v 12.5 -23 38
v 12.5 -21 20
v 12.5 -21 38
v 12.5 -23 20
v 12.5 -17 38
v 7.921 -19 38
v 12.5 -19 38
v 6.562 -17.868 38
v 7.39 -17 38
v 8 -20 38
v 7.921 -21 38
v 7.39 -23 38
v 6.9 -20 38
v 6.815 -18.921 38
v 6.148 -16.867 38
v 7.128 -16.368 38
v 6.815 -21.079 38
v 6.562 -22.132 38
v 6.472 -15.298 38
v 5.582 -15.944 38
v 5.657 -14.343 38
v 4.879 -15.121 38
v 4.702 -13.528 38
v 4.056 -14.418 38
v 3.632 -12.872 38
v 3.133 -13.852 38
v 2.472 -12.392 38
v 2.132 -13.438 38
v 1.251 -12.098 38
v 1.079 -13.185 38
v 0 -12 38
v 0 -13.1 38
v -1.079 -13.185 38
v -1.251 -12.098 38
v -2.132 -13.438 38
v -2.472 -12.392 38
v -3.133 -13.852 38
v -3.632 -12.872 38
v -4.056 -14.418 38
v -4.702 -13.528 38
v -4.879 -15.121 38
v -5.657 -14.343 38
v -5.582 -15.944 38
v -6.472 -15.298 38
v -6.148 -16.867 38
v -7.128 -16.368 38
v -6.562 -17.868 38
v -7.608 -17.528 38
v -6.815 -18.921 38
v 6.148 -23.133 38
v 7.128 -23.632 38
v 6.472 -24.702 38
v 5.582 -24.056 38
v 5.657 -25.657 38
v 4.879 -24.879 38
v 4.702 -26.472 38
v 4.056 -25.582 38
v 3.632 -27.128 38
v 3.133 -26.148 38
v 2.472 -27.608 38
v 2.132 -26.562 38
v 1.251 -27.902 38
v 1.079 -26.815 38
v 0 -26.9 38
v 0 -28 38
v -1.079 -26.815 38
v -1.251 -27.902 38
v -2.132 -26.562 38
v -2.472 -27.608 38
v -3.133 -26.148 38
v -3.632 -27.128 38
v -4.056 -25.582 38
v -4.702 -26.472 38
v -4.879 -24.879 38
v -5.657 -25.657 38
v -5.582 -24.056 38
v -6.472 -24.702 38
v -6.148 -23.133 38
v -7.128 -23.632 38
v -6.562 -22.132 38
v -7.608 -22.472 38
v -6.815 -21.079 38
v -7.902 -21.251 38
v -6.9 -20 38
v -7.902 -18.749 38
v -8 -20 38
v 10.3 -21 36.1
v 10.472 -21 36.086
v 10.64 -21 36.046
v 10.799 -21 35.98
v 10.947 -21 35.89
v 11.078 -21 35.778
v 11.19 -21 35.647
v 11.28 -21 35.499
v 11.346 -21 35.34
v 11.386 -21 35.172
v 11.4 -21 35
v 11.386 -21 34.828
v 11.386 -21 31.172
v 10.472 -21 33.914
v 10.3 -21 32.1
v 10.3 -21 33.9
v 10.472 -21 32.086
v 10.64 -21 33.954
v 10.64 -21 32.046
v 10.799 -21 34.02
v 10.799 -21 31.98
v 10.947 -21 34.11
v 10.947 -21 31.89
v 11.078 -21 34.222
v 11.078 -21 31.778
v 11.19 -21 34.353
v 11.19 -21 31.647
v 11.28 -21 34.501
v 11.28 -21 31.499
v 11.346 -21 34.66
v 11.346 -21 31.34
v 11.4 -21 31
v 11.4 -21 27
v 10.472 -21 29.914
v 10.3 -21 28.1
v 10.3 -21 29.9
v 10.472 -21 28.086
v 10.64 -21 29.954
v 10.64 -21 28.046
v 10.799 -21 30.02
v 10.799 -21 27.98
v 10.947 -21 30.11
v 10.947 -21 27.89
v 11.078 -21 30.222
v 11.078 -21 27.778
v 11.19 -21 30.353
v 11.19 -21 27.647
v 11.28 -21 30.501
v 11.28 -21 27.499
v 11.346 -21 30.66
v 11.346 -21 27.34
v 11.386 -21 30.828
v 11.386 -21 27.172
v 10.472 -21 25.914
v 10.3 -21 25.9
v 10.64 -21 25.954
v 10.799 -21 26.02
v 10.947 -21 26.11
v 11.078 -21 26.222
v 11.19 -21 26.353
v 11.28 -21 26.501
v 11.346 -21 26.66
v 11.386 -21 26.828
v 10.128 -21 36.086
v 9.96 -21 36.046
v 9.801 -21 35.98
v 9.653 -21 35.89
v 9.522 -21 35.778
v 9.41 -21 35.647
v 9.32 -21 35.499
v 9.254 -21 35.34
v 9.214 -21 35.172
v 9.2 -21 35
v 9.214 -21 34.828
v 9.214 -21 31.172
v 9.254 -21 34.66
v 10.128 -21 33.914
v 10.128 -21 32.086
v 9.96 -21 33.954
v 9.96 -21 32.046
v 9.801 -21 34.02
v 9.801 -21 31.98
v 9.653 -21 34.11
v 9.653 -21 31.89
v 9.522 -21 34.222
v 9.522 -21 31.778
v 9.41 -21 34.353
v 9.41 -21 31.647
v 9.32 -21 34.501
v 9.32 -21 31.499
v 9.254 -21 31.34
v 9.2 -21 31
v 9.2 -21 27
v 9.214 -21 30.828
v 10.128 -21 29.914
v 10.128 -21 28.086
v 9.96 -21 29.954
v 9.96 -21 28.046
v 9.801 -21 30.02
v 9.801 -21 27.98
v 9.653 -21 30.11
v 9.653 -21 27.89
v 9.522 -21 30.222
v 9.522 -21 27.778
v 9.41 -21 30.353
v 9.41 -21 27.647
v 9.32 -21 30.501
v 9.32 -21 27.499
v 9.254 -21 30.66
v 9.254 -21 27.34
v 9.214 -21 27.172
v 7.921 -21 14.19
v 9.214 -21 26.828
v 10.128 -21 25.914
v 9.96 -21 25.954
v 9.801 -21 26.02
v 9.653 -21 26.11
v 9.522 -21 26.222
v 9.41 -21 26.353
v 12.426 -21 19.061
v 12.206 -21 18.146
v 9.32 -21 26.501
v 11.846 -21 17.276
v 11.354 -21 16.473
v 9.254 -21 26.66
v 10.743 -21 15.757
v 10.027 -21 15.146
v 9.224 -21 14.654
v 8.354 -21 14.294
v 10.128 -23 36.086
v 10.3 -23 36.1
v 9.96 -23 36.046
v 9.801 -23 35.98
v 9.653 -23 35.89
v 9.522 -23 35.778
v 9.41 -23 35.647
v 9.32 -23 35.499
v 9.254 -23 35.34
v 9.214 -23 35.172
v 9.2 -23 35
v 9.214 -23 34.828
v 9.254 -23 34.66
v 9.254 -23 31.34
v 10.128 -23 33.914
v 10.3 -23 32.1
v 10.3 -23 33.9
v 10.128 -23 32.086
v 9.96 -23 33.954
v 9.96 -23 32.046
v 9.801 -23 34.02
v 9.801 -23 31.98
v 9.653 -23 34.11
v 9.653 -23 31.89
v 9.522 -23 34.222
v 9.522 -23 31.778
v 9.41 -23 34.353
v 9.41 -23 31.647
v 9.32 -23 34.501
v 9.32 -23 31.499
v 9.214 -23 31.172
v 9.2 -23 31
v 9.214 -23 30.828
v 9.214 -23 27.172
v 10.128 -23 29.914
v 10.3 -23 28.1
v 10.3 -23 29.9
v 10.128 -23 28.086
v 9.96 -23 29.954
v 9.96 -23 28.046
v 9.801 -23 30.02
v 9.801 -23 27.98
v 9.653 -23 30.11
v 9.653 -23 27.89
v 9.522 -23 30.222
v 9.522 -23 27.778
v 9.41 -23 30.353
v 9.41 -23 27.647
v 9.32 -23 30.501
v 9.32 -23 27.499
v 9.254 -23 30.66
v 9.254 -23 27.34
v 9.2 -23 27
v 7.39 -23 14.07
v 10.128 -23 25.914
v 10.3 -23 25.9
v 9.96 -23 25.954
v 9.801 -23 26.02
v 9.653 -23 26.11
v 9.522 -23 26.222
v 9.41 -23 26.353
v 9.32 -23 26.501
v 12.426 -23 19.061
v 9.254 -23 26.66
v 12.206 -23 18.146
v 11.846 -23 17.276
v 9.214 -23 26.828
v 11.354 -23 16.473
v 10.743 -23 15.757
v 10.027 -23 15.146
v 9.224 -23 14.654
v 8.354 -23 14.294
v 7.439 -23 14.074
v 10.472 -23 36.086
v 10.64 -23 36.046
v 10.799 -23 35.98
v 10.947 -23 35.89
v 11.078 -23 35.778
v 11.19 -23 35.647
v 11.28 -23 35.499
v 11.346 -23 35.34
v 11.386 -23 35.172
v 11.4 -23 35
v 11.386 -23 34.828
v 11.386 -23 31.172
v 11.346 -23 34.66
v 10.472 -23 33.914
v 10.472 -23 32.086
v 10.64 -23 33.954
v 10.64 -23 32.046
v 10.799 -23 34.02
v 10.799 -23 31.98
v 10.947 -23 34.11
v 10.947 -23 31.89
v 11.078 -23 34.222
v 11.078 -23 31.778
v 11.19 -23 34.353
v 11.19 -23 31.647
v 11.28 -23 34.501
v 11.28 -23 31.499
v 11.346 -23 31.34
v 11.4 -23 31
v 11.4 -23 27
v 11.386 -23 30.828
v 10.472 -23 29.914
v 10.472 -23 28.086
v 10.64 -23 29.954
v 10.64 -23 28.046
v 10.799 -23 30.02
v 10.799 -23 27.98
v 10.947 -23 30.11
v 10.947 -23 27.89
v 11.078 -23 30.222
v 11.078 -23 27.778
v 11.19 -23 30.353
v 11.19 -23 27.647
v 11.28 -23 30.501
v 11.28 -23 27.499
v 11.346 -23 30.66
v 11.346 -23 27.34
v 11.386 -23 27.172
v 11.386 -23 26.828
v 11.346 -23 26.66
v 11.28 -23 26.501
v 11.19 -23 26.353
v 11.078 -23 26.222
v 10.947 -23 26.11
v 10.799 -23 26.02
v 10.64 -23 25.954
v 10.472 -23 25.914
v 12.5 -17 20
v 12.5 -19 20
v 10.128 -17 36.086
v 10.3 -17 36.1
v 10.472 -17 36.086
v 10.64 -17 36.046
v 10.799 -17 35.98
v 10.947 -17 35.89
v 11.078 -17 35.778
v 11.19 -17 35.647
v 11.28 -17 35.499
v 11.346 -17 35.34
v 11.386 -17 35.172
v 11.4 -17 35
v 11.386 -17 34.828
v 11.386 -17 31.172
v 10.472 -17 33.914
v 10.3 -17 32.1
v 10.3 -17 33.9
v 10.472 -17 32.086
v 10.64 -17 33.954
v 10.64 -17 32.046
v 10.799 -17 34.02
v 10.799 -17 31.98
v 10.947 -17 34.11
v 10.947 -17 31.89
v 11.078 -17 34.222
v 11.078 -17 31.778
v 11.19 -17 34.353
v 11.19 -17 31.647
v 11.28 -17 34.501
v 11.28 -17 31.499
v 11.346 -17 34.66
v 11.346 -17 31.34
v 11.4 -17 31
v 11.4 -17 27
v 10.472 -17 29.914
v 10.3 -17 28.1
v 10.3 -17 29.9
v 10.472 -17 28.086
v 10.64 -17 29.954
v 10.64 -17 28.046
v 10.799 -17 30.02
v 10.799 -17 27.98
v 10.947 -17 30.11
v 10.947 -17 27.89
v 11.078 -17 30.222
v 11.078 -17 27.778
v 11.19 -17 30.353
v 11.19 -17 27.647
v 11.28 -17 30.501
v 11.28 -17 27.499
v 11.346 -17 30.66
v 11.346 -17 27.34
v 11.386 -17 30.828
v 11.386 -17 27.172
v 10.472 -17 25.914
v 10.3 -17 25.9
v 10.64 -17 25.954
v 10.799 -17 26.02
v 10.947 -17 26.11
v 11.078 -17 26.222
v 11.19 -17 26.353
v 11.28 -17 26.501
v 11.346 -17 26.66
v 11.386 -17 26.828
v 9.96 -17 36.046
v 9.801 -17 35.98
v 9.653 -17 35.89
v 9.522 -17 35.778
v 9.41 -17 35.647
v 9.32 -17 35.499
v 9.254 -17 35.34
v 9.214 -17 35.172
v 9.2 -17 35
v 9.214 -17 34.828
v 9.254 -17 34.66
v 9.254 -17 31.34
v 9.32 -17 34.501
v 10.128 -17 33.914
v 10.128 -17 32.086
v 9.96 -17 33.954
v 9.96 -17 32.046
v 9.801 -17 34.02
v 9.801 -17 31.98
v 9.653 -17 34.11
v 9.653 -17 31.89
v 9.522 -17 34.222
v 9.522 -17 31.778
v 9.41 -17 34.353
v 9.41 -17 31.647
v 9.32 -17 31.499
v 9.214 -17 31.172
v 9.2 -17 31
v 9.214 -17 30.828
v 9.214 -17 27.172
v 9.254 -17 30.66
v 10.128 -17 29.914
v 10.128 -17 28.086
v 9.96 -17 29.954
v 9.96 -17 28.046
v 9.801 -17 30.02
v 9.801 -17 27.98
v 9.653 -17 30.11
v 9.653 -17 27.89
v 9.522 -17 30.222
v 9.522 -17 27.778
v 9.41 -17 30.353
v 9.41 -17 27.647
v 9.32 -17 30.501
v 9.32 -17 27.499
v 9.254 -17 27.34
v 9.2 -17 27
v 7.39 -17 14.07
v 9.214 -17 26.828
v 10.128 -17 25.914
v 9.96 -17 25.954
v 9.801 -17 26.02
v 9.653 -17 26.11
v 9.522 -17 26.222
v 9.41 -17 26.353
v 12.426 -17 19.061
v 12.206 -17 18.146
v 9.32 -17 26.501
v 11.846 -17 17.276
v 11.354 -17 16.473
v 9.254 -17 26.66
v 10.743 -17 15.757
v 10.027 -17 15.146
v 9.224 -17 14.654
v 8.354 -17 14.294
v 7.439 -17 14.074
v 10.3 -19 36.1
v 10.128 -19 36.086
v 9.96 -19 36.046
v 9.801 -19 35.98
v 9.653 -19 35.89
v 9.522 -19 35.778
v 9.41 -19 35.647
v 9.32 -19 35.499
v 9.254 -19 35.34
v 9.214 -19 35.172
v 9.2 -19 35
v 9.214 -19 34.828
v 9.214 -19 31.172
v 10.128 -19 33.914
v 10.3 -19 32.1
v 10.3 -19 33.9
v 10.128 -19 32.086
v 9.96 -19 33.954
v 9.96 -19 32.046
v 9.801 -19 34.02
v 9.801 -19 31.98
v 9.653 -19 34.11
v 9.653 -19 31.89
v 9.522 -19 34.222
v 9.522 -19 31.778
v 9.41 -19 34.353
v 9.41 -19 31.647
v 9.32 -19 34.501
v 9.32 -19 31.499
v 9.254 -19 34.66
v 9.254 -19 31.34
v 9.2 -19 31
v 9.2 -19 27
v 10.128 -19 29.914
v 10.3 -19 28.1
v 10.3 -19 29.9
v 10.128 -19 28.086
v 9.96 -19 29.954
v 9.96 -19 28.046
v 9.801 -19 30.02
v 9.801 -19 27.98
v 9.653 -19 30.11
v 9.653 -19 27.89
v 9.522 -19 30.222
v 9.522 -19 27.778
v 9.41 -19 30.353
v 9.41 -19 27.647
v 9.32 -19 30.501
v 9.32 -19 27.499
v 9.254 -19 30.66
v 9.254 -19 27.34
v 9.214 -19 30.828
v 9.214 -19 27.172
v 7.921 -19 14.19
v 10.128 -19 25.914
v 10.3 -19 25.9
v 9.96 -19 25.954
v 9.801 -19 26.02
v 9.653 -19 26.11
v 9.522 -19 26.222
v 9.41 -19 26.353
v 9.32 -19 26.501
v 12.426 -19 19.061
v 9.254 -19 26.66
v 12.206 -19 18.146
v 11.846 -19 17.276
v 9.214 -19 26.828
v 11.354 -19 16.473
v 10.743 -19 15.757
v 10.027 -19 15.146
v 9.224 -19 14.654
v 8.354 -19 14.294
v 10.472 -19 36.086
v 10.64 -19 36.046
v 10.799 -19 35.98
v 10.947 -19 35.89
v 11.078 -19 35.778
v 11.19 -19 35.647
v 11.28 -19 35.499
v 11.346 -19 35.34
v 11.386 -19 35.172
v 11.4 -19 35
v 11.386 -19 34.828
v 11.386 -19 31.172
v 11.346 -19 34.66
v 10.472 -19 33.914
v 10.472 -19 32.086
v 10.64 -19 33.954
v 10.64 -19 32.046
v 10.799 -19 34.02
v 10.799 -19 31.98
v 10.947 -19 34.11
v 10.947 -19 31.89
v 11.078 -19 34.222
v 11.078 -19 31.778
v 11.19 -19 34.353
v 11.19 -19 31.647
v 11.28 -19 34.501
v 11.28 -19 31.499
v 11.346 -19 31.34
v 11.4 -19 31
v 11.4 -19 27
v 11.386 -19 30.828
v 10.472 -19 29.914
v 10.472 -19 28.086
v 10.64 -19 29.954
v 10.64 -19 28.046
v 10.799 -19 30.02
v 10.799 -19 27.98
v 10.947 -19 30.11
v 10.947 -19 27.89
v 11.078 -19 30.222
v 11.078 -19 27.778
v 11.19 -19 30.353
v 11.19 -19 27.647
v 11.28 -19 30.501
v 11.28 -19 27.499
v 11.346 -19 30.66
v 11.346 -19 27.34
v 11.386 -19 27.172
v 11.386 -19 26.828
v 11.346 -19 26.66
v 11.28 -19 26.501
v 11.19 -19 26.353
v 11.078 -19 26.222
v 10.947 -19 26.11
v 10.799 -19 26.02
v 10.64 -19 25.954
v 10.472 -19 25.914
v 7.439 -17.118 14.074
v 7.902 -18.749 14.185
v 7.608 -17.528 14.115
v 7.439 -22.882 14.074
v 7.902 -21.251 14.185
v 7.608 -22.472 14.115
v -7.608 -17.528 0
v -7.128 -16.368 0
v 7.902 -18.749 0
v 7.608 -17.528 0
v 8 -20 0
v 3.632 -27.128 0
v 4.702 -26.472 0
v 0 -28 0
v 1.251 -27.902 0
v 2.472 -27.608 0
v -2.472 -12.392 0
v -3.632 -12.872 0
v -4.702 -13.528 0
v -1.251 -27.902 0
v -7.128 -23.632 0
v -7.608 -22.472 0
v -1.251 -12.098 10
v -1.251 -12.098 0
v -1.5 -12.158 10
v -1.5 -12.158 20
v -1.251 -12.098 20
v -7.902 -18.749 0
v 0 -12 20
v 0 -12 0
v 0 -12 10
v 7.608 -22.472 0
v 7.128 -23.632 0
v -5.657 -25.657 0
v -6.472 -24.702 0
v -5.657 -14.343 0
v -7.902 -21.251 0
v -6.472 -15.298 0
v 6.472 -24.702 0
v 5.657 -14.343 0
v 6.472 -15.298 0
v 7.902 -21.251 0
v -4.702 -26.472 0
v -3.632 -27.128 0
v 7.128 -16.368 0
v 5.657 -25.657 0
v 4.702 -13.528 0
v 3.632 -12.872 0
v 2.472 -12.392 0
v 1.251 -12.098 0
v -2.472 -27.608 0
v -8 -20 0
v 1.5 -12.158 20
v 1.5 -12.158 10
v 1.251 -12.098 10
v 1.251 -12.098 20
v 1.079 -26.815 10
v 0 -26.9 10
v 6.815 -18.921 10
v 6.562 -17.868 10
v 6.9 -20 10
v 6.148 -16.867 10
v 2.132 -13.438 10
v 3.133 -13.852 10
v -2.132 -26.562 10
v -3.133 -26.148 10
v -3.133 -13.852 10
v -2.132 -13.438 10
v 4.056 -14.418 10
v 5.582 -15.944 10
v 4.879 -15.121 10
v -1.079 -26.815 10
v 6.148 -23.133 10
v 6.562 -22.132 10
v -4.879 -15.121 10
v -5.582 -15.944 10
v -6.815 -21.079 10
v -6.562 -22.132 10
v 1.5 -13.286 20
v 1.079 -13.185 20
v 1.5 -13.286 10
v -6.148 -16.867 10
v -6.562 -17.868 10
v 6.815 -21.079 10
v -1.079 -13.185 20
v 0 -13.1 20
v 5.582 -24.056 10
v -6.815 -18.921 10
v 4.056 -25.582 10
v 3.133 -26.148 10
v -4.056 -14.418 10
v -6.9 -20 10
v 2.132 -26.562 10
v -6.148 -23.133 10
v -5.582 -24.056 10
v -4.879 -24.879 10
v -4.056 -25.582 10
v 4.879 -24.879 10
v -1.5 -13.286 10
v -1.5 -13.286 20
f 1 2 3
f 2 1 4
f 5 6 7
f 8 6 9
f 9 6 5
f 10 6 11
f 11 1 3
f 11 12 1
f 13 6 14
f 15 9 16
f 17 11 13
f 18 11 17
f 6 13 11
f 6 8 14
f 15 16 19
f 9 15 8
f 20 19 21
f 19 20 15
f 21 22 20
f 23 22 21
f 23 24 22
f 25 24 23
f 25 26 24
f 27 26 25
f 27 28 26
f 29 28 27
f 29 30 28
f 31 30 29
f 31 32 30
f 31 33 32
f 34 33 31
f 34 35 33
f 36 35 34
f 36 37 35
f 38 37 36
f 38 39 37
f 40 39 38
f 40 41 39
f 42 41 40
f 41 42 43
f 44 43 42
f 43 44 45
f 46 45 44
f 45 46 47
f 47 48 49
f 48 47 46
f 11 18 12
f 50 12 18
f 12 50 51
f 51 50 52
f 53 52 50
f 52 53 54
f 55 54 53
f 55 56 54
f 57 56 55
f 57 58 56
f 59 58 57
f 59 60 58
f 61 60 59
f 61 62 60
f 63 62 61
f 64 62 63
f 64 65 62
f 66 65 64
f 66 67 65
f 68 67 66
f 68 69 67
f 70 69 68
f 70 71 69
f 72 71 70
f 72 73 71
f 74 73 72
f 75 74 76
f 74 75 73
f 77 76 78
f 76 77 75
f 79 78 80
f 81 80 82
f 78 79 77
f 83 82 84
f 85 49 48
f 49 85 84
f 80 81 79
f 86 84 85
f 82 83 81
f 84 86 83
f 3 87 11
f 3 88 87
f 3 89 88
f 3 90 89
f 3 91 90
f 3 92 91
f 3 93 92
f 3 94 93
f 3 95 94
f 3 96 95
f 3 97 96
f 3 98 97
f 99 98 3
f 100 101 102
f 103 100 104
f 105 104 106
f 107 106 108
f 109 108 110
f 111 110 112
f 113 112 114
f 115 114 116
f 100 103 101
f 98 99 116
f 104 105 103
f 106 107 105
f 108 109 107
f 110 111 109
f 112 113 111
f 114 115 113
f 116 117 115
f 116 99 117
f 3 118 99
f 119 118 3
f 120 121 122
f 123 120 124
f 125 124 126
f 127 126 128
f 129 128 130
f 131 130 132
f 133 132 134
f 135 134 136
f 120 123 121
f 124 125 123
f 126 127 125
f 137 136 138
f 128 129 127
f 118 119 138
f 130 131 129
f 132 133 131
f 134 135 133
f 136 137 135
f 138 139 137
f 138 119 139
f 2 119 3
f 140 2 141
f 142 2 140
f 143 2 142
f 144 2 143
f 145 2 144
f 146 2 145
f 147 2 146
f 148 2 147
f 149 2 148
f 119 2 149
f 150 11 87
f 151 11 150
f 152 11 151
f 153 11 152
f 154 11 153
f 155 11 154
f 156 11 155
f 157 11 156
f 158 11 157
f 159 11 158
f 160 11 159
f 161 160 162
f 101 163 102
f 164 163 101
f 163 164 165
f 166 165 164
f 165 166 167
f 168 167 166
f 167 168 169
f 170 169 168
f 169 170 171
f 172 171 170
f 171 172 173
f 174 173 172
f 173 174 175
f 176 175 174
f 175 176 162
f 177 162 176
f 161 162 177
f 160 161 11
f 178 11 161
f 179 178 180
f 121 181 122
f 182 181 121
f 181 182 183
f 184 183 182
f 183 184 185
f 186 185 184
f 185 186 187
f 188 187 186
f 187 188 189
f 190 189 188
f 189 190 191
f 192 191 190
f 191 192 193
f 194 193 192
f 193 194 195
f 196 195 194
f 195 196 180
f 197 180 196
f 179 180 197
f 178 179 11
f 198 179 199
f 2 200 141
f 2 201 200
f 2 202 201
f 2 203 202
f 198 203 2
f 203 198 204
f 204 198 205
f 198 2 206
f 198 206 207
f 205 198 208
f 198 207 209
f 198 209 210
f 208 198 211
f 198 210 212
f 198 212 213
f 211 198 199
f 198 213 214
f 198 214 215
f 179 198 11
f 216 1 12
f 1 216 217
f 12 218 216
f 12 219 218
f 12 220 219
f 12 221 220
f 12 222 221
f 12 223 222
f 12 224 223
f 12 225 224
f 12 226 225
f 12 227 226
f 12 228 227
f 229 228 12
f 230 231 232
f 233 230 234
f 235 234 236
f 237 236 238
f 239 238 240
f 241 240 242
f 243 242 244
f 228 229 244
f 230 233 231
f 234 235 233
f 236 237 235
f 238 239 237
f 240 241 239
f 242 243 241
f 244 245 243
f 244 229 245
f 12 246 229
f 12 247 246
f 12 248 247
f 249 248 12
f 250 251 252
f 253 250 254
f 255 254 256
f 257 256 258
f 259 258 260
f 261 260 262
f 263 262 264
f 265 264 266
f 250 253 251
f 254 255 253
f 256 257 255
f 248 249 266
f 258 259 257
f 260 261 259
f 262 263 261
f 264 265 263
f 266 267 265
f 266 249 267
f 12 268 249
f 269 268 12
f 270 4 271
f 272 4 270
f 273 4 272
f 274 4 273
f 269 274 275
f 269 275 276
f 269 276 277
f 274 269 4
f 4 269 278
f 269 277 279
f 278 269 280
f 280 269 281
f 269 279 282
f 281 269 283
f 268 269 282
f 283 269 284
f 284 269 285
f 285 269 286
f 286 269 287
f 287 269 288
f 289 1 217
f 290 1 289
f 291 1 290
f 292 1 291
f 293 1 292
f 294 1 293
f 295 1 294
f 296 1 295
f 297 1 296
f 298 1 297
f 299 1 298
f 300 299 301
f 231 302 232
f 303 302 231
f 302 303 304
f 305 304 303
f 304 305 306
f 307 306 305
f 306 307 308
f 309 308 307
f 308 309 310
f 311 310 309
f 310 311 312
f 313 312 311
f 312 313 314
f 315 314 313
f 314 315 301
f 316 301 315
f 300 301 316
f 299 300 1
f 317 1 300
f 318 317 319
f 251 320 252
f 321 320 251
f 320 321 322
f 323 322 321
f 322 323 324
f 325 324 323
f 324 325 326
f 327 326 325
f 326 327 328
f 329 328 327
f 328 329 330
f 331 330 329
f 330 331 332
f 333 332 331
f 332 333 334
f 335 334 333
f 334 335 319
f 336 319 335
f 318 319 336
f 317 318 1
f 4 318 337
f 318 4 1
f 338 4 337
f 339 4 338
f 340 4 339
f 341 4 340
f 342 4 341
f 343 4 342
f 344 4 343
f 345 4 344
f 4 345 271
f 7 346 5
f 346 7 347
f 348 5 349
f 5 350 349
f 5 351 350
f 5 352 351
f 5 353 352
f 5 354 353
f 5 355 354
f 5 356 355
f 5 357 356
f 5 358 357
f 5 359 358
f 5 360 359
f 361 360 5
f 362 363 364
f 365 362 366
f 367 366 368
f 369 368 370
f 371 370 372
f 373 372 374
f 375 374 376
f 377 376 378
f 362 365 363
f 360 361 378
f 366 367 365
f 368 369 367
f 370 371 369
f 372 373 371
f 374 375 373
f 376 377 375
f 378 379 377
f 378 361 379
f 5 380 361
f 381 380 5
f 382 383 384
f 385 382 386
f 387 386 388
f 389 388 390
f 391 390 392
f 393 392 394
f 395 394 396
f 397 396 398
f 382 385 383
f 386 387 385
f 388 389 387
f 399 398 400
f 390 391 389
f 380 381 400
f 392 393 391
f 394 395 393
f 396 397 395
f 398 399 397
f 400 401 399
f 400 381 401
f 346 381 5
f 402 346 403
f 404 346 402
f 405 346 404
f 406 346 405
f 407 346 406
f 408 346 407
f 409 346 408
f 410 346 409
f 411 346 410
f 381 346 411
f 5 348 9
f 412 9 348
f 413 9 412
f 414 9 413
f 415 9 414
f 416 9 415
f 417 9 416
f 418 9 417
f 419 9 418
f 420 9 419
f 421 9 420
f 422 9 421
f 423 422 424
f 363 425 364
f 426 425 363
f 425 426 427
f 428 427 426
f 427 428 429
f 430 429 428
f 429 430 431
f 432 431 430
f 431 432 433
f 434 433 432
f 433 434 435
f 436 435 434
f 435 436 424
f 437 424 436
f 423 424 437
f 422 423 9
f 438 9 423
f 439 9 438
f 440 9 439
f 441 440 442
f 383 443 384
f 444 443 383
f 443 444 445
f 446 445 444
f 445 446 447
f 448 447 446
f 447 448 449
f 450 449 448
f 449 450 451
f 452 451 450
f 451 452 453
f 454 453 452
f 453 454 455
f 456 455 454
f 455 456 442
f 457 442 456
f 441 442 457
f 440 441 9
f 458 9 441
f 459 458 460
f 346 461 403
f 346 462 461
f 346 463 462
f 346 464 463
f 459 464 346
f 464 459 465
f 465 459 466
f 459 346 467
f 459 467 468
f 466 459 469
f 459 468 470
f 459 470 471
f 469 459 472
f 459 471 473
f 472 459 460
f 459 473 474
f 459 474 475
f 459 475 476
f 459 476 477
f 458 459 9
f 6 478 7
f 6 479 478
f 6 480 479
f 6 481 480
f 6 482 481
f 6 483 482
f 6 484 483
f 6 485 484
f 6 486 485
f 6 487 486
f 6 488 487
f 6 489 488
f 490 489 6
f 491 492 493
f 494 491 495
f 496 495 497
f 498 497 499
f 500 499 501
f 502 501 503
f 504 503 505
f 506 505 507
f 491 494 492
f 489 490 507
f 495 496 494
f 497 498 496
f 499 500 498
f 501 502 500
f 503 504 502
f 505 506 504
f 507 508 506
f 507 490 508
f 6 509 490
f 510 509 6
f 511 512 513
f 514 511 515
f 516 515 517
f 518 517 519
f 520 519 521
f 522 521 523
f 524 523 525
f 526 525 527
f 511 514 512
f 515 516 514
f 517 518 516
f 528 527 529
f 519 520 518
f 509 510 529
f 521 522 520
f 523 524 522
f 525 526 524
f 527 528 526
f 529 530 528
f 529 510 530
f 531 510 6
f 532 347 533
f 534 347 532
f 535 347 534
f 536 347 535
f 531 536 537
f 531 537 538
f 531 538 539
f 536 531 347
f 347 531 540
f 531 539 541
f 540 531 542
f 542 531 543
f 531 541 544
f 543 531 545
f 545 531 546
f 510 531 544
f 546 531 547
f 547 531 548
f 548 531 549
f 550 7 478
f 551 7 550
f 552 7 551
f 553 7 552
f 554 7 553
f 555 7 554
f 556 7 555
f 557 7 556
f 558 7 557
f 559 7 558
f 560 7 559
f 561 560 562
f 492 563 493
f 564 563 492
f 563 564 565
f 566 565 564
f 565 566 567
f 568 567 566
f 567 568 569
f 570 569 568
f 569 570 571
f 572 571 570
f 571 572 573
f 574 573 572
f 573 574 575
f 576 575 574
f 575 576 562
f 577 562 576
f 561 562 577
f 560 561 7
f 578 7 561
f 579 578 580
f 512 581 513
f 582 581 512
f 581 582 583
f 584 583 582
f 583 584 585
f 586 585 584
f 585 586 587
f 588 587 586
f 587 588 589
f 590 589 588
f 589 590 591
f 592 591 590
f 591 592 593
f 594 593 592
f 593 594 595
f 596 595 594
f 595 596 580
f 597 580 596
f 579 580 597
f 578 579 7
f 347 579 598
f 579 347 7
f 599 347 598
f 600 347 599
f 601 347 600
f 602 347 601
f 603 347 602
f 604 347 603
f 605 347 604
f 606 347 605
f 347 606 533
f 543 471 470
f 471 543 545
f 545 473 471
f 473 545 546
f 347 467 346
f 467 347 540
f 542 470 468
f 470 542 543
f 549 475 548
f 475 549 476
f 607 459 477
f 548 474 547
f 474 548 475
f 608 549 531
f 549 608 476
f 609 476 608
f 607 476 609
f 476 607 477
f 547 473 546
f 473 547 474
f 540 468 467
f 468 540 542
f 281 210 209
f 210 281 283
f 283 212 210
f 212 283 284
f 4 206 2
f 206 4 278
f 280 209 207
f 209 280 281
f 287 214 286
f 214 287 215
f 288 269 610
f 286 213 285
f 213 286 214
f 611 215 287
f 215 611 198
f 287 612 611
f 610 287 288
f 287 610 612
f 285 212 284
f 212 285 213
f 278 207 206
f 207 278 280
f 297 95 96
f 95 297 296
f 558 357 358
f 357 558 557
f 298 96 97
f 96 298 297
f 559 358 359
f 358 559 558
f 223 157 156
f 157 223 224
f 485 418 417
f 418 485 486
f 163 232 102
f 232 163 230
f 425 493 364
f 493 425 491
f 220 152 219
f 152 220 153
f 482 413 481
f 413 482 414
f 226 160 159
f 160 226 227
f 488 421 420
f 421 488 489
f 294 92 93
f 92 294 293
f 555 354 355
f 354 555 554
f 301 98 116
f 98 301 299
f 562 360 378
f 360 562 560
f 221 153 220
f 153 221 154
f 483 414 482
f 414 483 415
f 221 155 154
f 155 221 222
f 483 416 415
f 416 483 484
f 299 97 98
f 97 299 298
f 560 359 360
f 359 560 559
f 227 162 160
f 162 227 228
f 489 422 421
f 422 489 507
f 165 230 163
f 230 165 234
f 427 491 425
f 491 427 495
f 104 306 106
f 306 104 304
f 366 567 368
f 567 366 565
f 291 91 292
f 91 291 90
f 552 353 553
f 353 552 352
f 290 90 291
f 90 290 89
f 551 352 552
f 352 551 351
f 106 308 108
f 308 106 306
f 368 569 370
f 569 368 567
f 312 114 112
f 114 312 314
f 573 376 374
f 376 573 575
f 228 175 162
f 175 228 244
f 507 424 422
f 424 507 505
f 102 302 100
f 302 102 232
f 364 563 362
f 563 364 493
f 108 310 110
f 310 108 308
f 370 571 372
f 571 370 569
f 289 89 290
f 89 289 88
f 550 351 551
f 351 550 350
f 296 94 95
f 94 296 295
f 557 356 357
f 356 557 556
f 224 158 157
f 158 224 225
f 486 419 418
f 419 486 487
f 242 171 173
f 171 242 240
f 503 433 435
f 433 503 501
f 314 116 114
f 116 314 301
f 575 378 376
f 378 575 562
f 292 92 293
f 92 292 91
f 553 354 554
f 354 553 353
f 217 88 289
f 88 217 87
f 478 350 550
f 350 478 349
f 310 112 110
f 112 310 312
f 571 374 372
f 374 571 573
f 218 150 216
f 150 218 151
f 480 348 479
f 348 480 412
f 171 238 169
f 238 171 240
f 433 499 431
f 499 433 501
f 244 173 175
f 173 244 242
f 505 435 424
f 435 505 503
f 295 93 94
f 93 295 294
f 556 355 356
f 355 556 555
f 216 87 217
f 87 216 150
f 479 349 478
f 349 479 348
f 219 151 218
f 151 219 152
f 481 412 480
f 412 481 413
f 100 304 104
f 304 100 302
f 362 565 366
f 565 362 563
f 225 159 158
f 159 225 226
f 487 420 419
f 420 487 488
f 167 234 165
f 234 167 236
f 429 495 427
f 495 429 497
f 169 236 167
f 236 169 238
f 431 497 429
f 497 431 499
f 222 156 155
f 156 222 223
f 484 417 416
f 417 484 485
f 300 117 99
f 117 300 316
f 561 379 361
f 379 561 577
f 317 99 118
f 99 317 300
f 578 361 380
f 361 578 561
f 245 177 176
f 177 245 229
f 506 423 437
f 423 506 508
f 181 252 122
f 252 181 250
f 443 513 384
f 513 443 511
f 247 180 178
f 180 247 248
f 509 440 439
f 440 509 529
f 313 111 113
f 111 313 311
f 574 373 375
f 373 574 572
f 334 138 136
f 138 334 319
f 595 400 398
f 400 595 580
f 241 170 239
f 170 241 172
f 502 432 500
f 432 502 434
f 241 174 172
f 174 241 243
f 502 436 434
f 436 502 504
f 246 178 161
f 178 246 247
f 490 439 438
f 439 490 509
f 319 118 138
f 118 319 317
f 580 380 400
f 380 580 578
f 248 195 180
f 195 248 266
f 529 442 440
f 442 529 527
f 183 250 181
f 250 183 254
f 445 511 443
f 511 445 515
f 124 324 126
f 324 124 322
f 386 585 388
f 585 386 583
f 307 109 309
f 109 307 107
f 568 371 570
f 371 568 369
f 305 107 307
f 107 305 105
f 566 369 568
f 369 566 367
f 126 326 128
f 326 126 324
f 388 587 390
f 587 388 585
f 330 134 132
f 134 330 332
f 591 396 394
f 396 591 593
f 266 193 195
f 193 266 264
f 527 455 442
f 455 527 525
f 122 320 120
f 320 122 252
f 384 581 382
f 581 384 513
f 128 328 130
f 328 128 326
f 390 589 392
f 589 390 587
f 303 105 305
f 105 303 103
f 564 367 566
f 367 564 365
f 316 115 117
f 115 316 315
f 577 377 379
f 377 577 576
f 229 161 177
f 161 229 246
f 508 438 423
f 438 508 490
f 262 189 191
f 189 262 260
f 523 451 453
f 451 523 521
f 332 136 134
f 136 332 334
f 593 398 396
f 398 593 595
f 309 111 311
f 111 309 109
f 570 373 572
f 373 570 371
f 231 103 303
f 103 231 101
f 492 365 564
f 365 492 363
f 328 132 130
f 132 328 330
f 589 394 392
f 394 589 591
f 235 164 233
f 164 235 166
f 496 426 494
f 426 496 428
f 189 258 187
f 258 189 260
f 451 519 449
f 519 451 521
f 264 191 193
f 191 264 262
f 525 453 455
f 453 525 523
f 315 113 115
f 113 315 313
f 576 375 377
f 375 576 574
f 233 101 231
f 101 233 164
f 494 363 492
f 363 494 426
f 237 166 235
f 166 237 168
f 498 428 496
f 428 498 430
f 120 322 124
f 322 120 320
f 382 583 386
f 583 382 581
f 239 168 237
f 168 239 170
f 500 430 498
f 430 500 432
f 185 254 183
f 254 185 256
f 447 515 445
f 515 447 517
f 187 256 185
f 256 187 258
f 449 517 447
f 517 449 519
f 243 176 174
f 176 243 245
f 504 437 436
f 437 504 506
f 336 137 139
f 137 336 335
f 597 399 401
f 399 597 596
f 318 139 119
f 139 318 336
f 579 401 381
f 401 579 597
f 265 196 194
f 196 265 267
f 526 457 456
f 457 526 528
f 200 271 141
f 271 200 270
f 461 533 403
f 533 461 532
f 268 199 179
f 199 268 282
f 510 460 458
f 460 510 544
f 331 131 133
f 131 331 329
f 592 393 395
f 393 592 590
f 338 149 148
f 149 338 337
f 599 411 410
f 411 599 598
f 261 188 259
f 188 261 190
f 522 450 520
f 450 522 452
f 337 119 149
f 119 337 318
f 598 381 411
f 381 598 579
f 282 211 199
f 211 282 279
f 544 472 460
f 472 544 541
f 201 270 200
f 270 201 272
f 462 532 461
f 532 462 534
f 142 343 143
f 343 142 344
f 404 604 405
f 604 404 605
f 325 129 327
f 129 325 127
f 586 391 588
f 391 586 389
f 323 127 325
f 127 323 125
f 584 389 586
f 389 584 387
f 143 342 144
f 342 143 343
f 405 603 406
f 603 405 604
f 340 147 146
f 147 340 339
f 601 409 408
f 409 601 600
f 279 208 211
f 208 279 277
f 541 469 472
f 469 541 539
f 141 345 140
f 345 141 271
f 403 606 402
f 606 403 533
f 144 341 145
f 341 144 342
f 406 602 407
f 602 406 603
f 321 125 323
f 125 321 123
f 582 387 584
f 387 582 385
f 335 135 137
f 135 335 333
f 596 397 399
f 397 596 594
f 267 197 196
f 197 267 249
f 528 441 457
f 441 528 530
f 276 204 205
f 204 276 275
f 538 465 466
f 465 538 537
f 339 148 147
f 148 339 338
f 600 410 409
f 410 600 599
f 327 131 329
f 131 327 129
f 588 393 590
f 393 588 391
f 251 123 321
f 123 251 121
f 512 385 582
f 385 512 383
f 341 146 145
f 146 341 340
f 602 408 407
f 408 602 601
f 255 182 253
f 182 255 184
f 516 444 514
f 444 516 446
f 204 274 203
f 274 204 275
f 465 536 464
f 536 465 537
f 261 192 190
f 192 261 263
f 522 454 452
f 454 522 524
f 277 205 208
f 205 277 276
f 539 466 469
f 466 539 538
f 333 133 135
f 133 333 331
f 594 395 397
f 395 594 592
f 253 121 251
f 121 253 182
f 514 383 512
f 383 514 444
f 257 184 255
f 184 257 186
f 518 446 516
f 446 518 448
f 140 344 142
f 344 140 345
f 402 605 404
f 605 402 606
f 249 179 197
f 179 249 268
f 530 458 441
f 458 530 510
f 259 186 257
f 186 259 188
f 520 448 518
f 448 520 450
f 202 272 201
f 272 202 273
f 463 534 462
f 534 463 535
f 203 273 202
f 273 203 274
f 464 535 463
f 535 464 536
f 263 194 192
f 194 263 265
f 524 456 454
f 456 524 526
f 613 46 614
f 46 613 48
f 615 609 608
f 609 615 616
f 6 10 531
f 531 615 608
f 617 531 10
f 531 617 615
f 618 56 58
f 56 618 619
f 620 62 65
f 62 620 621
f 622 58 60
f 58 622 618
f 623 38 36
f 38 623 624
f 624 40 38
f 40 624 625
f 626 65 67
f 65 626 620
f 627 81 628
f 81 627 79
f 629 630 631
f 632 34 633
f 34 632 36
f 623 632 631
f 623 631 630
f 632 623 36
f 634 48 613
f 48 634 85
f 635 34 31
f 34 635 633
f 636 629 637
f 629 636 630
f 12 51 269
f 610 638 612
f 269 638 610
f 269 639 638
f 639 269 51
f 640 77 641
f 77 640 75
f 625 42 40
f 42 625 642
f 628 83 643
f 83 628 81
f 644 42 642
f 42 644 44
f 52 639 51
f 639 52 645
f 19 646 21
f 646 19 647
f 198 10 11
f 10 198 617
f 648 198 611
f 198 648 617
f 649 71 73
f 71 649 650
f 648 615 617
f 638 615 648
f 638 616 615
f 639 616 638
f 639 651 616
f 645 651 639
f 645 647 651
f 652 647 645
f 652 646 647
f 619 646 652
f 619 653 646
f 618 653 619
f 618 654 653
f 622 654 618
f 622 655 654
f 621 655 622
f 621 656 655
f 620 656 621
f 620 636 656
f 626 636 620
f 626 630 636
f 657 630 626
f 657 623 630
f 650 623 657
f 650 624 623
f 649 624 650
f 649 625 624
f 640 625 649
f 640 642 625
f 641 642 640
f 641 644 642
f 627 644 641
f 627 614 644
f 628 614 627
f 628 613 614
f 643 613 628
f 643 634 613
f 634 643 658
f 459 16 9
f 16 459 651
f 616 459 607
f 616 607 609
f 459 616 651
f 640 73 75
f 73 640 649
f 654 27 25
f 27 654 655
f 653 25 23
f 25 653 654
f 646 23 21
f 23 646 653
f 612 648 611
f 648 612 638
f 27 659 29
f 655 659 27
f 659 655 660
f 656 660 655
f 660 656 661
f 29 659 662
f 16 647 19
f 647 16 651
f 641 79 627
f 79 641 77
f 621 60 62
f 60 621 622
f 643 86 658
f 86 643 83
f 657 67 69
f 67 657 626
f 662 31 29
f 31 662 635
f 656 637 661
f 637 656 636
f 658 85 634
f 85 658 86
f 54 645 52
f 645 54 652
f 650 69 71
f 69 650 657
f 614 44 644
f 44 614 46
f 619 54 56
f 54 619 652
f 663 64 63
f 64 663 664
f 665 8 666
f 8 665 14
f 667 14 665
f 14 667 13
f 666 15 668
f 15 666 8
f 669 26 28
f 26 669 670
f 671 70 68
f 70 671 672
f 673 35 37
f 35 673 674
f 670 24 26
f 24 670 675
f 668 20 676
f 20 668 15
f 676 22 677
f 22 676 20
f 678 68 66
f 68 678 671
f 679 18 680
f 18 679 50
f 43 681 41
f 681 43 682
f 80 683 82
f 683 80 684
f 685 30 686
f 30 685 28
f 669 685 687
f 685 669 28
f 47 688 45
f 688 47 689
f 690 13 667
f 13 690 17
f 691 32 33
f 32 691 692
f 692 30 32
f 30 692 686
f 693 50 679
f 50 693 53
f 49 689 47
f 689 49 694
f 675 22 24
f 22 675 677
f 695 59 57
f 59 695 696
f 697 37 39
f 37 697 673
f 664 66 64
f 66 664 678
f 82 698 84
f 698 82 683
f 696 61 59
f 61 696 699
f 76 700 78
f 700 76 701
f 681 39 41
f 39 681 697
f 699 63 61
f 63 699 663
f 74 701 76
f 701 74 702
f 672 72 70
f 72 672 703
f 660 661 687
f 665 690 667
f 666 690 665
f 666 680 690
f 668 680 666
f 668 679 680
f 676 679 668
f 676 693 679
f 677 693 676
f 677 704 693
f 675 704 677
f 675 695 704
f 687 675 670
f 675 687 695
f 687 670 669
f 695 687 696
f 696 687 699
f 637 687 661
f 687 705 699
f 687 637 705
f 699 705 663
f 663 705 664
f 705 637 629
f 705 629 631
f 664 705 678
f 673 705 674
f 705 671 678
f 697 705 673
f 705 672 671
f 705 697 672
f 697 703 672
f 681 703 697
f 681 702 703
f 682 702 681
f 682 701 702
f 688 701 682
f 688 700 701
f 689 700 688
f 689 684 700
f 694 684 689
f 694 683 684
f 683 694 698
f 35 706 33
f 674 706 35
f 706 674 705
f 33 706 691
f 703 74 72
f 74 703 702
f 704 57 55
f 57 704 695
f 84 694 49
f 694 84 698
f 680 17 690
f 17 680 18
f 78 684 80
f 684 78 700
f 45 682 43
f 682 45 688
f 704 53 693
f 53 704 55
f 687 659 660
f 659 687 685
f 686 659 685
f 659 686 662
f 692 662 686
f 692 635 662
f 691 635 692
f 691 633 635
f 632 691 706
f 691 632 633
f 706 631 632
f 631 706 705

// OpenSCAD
$fn=40;
//hitter();
//mirror()plate();
//mirror()plate_small();
hitter_small();
//link();
//link_small();

module link(){ difference(){
    union(){
cube([5,14.5,2]);
        translate([5,4,0])cube([5,10,2]);
translate([2.5,0,0])cylinder(d=5,h=2);
        translate([2.5,14.5,0])cylinder(d=5,h=2);
translate([2.5,12,0])cube([32.5,5,2]);
translate([35,14.5,0])cylinder(d=5,h=2);

    }
translate([2.5,0,0])cylinder(d=1.6,h=2);
translate([35,14.5,0])cylinder(d=1.6,h=2); 
 translate([1,8-1.5,0])cube([1.8,3.2,4]);
 translate([4,8-1.5,0])cube([1.8,3.2,4]);  
 translate([7,8-1.5,0])cube([1.8,3.2,4]);     
}}

module link_small(){ difference(){
    union(){
cube([5,10,1.4]);
        translate([5,2.8,0])cube([5,8,1.4]);
translate([2.5,0,0])cylinder(d=5,h=1.4);
        translate([2.5,10,0])cylinder(d=5,h=1.4);
translate([2.5,7.5,0])cube([28.5,5,1.4]);
translate([31,10,0])cylinder(d=5,h=1.4);

    }
translate([2.5,0,0])cylinder(d=1.6,h=2);
translate([31,10,0])cylinder(d=1.6,h=2); 
 translate([1,5.5-1.5,0])cube([1.8,3.2,4]);
 translate([4,5.5-1.5,0])cube([1.8,3.2,4]);  
 translate([7,5.5-1.5,0])cube([1.8,3.2,4]);     
}}
module plate(){
difference(){
union(){cube([20,40,4.5]);
translate([10,0,0])cylinder(d=20,h=4.5);
    translate([10,40,0])cylinder(d=20,h=4.5);
    translate([25,15,0])cylinder(d=20,h=4.5);
    translate([20,5,0])cube([5,20,4.5]);
    translate([0,13,4.5])cube([5,4,2.5]);
}
translate([10,0,0])cylinder(d=15,h=4.5);
translate([14,15,0])cylinder(d=4,h=4.5);
translate([10,40,0])cylinder(d=9.6,h=4.5);
 translate([25,15,0])cylinder(d=11.2,h=4.5);
translate([0.75,14.25,0])cube([3.5,1.5,8]);
}
}
module plate_small(){
difference(){
union(){cube([15,35,3]);
translate([7.5,0,0])cylinder(d=15,h=3);
    translate([7.5,35,0])cylinder(d=15,h=3);
    translate([20,15,0])cylinder(d=15,h=3);
    translate([15,7.5,0])cube([5,15,3]);
    translate([0,13,3])cube([5,4,2.5]);
}
translate([7.5,0,0])cylinder(d=10,h=3);
translate([10,15,0])cylinder(d=4,h=4.5);
translate([7.5,35,0])cylinder(d=9.6,h=4.5);
 translate([20,15,0])cylinder(d=11.2,h=4.5);
translate([1,14.25,0])cube([3,1.4,8]);
}
}
module hitter() {
  translate([0, -0, 0]) {
    difference() {
      union() {
        cylinder(d = 23, h = 52);
        translate([11, 0, 34]) {
          difference() {
            union() {
              translate([0, -3.3, 0])cube([6, 2, 18]);
              translate([0, 1.3, 0])cube([6, 2, 18]);
              translate([0, 3.3, 0])rotate([90, 0, 0])cylinder(d = 12, h = 2);
              translate([0, -1.3, 0])rotate([90, 0, 0])cylinder(d = 12, h = 2);
            }
            translate([3.5, 10, 15])rotate([90, 0, 0])cylinder(d = 2.2, h = 18);
            translate([3.5, 10, 11])rotate([90, 0, 0])cylinder(d = 2.2, h = 18);
            translate([3.5, 10, 7])rotate([90, 0, 0])cylinder(d = 2.2, h = 18);
          }
        }
      }
      translate([0, 0, 10])cylinder(d = 20, h = 42.1);
      translate([-2, 0, 10])cube([4, 20, 12]);
    }
  }
}

module hitter_small() {
  translate([0, -20, 0]) {
    difference() {
        union() {
      cylinder(d = 16, h = 38);
                translate([6.5, 0, 20]) {
          difference() {
            union() {
              translate([0, -3, 0])cube([6, 2, 18]);
              translate([0, 1, 0])cube([6, 2, 18]);
              translate([0, 3, 0])rotate([90, 0, 0])cylinder(d = 12, h = 2);
              translate([0, -1, 0])rotate([90, 0, 0])cylinder(d = 12, h = 2);
            }
            translate([3.8, 10, 15])rotate([90, 0, 0])cylinder(d = 2.2, h = 18);
            translate([3.8, 10, 11])rotate([90, 0, 0])cylinder(d = 2.2, h = 18);
            translate([3.8, 10, 7])rotate([90, 0, 0])cylinder(d = 2.2, h = 18);
          }
        }    
            
        }
      translate([0, 0, 10])cylinder(d = 13.8, h = 28.1);
      translate([-1.5, 0, 10])cube([3, 10, 10]);
    }
  }
}
